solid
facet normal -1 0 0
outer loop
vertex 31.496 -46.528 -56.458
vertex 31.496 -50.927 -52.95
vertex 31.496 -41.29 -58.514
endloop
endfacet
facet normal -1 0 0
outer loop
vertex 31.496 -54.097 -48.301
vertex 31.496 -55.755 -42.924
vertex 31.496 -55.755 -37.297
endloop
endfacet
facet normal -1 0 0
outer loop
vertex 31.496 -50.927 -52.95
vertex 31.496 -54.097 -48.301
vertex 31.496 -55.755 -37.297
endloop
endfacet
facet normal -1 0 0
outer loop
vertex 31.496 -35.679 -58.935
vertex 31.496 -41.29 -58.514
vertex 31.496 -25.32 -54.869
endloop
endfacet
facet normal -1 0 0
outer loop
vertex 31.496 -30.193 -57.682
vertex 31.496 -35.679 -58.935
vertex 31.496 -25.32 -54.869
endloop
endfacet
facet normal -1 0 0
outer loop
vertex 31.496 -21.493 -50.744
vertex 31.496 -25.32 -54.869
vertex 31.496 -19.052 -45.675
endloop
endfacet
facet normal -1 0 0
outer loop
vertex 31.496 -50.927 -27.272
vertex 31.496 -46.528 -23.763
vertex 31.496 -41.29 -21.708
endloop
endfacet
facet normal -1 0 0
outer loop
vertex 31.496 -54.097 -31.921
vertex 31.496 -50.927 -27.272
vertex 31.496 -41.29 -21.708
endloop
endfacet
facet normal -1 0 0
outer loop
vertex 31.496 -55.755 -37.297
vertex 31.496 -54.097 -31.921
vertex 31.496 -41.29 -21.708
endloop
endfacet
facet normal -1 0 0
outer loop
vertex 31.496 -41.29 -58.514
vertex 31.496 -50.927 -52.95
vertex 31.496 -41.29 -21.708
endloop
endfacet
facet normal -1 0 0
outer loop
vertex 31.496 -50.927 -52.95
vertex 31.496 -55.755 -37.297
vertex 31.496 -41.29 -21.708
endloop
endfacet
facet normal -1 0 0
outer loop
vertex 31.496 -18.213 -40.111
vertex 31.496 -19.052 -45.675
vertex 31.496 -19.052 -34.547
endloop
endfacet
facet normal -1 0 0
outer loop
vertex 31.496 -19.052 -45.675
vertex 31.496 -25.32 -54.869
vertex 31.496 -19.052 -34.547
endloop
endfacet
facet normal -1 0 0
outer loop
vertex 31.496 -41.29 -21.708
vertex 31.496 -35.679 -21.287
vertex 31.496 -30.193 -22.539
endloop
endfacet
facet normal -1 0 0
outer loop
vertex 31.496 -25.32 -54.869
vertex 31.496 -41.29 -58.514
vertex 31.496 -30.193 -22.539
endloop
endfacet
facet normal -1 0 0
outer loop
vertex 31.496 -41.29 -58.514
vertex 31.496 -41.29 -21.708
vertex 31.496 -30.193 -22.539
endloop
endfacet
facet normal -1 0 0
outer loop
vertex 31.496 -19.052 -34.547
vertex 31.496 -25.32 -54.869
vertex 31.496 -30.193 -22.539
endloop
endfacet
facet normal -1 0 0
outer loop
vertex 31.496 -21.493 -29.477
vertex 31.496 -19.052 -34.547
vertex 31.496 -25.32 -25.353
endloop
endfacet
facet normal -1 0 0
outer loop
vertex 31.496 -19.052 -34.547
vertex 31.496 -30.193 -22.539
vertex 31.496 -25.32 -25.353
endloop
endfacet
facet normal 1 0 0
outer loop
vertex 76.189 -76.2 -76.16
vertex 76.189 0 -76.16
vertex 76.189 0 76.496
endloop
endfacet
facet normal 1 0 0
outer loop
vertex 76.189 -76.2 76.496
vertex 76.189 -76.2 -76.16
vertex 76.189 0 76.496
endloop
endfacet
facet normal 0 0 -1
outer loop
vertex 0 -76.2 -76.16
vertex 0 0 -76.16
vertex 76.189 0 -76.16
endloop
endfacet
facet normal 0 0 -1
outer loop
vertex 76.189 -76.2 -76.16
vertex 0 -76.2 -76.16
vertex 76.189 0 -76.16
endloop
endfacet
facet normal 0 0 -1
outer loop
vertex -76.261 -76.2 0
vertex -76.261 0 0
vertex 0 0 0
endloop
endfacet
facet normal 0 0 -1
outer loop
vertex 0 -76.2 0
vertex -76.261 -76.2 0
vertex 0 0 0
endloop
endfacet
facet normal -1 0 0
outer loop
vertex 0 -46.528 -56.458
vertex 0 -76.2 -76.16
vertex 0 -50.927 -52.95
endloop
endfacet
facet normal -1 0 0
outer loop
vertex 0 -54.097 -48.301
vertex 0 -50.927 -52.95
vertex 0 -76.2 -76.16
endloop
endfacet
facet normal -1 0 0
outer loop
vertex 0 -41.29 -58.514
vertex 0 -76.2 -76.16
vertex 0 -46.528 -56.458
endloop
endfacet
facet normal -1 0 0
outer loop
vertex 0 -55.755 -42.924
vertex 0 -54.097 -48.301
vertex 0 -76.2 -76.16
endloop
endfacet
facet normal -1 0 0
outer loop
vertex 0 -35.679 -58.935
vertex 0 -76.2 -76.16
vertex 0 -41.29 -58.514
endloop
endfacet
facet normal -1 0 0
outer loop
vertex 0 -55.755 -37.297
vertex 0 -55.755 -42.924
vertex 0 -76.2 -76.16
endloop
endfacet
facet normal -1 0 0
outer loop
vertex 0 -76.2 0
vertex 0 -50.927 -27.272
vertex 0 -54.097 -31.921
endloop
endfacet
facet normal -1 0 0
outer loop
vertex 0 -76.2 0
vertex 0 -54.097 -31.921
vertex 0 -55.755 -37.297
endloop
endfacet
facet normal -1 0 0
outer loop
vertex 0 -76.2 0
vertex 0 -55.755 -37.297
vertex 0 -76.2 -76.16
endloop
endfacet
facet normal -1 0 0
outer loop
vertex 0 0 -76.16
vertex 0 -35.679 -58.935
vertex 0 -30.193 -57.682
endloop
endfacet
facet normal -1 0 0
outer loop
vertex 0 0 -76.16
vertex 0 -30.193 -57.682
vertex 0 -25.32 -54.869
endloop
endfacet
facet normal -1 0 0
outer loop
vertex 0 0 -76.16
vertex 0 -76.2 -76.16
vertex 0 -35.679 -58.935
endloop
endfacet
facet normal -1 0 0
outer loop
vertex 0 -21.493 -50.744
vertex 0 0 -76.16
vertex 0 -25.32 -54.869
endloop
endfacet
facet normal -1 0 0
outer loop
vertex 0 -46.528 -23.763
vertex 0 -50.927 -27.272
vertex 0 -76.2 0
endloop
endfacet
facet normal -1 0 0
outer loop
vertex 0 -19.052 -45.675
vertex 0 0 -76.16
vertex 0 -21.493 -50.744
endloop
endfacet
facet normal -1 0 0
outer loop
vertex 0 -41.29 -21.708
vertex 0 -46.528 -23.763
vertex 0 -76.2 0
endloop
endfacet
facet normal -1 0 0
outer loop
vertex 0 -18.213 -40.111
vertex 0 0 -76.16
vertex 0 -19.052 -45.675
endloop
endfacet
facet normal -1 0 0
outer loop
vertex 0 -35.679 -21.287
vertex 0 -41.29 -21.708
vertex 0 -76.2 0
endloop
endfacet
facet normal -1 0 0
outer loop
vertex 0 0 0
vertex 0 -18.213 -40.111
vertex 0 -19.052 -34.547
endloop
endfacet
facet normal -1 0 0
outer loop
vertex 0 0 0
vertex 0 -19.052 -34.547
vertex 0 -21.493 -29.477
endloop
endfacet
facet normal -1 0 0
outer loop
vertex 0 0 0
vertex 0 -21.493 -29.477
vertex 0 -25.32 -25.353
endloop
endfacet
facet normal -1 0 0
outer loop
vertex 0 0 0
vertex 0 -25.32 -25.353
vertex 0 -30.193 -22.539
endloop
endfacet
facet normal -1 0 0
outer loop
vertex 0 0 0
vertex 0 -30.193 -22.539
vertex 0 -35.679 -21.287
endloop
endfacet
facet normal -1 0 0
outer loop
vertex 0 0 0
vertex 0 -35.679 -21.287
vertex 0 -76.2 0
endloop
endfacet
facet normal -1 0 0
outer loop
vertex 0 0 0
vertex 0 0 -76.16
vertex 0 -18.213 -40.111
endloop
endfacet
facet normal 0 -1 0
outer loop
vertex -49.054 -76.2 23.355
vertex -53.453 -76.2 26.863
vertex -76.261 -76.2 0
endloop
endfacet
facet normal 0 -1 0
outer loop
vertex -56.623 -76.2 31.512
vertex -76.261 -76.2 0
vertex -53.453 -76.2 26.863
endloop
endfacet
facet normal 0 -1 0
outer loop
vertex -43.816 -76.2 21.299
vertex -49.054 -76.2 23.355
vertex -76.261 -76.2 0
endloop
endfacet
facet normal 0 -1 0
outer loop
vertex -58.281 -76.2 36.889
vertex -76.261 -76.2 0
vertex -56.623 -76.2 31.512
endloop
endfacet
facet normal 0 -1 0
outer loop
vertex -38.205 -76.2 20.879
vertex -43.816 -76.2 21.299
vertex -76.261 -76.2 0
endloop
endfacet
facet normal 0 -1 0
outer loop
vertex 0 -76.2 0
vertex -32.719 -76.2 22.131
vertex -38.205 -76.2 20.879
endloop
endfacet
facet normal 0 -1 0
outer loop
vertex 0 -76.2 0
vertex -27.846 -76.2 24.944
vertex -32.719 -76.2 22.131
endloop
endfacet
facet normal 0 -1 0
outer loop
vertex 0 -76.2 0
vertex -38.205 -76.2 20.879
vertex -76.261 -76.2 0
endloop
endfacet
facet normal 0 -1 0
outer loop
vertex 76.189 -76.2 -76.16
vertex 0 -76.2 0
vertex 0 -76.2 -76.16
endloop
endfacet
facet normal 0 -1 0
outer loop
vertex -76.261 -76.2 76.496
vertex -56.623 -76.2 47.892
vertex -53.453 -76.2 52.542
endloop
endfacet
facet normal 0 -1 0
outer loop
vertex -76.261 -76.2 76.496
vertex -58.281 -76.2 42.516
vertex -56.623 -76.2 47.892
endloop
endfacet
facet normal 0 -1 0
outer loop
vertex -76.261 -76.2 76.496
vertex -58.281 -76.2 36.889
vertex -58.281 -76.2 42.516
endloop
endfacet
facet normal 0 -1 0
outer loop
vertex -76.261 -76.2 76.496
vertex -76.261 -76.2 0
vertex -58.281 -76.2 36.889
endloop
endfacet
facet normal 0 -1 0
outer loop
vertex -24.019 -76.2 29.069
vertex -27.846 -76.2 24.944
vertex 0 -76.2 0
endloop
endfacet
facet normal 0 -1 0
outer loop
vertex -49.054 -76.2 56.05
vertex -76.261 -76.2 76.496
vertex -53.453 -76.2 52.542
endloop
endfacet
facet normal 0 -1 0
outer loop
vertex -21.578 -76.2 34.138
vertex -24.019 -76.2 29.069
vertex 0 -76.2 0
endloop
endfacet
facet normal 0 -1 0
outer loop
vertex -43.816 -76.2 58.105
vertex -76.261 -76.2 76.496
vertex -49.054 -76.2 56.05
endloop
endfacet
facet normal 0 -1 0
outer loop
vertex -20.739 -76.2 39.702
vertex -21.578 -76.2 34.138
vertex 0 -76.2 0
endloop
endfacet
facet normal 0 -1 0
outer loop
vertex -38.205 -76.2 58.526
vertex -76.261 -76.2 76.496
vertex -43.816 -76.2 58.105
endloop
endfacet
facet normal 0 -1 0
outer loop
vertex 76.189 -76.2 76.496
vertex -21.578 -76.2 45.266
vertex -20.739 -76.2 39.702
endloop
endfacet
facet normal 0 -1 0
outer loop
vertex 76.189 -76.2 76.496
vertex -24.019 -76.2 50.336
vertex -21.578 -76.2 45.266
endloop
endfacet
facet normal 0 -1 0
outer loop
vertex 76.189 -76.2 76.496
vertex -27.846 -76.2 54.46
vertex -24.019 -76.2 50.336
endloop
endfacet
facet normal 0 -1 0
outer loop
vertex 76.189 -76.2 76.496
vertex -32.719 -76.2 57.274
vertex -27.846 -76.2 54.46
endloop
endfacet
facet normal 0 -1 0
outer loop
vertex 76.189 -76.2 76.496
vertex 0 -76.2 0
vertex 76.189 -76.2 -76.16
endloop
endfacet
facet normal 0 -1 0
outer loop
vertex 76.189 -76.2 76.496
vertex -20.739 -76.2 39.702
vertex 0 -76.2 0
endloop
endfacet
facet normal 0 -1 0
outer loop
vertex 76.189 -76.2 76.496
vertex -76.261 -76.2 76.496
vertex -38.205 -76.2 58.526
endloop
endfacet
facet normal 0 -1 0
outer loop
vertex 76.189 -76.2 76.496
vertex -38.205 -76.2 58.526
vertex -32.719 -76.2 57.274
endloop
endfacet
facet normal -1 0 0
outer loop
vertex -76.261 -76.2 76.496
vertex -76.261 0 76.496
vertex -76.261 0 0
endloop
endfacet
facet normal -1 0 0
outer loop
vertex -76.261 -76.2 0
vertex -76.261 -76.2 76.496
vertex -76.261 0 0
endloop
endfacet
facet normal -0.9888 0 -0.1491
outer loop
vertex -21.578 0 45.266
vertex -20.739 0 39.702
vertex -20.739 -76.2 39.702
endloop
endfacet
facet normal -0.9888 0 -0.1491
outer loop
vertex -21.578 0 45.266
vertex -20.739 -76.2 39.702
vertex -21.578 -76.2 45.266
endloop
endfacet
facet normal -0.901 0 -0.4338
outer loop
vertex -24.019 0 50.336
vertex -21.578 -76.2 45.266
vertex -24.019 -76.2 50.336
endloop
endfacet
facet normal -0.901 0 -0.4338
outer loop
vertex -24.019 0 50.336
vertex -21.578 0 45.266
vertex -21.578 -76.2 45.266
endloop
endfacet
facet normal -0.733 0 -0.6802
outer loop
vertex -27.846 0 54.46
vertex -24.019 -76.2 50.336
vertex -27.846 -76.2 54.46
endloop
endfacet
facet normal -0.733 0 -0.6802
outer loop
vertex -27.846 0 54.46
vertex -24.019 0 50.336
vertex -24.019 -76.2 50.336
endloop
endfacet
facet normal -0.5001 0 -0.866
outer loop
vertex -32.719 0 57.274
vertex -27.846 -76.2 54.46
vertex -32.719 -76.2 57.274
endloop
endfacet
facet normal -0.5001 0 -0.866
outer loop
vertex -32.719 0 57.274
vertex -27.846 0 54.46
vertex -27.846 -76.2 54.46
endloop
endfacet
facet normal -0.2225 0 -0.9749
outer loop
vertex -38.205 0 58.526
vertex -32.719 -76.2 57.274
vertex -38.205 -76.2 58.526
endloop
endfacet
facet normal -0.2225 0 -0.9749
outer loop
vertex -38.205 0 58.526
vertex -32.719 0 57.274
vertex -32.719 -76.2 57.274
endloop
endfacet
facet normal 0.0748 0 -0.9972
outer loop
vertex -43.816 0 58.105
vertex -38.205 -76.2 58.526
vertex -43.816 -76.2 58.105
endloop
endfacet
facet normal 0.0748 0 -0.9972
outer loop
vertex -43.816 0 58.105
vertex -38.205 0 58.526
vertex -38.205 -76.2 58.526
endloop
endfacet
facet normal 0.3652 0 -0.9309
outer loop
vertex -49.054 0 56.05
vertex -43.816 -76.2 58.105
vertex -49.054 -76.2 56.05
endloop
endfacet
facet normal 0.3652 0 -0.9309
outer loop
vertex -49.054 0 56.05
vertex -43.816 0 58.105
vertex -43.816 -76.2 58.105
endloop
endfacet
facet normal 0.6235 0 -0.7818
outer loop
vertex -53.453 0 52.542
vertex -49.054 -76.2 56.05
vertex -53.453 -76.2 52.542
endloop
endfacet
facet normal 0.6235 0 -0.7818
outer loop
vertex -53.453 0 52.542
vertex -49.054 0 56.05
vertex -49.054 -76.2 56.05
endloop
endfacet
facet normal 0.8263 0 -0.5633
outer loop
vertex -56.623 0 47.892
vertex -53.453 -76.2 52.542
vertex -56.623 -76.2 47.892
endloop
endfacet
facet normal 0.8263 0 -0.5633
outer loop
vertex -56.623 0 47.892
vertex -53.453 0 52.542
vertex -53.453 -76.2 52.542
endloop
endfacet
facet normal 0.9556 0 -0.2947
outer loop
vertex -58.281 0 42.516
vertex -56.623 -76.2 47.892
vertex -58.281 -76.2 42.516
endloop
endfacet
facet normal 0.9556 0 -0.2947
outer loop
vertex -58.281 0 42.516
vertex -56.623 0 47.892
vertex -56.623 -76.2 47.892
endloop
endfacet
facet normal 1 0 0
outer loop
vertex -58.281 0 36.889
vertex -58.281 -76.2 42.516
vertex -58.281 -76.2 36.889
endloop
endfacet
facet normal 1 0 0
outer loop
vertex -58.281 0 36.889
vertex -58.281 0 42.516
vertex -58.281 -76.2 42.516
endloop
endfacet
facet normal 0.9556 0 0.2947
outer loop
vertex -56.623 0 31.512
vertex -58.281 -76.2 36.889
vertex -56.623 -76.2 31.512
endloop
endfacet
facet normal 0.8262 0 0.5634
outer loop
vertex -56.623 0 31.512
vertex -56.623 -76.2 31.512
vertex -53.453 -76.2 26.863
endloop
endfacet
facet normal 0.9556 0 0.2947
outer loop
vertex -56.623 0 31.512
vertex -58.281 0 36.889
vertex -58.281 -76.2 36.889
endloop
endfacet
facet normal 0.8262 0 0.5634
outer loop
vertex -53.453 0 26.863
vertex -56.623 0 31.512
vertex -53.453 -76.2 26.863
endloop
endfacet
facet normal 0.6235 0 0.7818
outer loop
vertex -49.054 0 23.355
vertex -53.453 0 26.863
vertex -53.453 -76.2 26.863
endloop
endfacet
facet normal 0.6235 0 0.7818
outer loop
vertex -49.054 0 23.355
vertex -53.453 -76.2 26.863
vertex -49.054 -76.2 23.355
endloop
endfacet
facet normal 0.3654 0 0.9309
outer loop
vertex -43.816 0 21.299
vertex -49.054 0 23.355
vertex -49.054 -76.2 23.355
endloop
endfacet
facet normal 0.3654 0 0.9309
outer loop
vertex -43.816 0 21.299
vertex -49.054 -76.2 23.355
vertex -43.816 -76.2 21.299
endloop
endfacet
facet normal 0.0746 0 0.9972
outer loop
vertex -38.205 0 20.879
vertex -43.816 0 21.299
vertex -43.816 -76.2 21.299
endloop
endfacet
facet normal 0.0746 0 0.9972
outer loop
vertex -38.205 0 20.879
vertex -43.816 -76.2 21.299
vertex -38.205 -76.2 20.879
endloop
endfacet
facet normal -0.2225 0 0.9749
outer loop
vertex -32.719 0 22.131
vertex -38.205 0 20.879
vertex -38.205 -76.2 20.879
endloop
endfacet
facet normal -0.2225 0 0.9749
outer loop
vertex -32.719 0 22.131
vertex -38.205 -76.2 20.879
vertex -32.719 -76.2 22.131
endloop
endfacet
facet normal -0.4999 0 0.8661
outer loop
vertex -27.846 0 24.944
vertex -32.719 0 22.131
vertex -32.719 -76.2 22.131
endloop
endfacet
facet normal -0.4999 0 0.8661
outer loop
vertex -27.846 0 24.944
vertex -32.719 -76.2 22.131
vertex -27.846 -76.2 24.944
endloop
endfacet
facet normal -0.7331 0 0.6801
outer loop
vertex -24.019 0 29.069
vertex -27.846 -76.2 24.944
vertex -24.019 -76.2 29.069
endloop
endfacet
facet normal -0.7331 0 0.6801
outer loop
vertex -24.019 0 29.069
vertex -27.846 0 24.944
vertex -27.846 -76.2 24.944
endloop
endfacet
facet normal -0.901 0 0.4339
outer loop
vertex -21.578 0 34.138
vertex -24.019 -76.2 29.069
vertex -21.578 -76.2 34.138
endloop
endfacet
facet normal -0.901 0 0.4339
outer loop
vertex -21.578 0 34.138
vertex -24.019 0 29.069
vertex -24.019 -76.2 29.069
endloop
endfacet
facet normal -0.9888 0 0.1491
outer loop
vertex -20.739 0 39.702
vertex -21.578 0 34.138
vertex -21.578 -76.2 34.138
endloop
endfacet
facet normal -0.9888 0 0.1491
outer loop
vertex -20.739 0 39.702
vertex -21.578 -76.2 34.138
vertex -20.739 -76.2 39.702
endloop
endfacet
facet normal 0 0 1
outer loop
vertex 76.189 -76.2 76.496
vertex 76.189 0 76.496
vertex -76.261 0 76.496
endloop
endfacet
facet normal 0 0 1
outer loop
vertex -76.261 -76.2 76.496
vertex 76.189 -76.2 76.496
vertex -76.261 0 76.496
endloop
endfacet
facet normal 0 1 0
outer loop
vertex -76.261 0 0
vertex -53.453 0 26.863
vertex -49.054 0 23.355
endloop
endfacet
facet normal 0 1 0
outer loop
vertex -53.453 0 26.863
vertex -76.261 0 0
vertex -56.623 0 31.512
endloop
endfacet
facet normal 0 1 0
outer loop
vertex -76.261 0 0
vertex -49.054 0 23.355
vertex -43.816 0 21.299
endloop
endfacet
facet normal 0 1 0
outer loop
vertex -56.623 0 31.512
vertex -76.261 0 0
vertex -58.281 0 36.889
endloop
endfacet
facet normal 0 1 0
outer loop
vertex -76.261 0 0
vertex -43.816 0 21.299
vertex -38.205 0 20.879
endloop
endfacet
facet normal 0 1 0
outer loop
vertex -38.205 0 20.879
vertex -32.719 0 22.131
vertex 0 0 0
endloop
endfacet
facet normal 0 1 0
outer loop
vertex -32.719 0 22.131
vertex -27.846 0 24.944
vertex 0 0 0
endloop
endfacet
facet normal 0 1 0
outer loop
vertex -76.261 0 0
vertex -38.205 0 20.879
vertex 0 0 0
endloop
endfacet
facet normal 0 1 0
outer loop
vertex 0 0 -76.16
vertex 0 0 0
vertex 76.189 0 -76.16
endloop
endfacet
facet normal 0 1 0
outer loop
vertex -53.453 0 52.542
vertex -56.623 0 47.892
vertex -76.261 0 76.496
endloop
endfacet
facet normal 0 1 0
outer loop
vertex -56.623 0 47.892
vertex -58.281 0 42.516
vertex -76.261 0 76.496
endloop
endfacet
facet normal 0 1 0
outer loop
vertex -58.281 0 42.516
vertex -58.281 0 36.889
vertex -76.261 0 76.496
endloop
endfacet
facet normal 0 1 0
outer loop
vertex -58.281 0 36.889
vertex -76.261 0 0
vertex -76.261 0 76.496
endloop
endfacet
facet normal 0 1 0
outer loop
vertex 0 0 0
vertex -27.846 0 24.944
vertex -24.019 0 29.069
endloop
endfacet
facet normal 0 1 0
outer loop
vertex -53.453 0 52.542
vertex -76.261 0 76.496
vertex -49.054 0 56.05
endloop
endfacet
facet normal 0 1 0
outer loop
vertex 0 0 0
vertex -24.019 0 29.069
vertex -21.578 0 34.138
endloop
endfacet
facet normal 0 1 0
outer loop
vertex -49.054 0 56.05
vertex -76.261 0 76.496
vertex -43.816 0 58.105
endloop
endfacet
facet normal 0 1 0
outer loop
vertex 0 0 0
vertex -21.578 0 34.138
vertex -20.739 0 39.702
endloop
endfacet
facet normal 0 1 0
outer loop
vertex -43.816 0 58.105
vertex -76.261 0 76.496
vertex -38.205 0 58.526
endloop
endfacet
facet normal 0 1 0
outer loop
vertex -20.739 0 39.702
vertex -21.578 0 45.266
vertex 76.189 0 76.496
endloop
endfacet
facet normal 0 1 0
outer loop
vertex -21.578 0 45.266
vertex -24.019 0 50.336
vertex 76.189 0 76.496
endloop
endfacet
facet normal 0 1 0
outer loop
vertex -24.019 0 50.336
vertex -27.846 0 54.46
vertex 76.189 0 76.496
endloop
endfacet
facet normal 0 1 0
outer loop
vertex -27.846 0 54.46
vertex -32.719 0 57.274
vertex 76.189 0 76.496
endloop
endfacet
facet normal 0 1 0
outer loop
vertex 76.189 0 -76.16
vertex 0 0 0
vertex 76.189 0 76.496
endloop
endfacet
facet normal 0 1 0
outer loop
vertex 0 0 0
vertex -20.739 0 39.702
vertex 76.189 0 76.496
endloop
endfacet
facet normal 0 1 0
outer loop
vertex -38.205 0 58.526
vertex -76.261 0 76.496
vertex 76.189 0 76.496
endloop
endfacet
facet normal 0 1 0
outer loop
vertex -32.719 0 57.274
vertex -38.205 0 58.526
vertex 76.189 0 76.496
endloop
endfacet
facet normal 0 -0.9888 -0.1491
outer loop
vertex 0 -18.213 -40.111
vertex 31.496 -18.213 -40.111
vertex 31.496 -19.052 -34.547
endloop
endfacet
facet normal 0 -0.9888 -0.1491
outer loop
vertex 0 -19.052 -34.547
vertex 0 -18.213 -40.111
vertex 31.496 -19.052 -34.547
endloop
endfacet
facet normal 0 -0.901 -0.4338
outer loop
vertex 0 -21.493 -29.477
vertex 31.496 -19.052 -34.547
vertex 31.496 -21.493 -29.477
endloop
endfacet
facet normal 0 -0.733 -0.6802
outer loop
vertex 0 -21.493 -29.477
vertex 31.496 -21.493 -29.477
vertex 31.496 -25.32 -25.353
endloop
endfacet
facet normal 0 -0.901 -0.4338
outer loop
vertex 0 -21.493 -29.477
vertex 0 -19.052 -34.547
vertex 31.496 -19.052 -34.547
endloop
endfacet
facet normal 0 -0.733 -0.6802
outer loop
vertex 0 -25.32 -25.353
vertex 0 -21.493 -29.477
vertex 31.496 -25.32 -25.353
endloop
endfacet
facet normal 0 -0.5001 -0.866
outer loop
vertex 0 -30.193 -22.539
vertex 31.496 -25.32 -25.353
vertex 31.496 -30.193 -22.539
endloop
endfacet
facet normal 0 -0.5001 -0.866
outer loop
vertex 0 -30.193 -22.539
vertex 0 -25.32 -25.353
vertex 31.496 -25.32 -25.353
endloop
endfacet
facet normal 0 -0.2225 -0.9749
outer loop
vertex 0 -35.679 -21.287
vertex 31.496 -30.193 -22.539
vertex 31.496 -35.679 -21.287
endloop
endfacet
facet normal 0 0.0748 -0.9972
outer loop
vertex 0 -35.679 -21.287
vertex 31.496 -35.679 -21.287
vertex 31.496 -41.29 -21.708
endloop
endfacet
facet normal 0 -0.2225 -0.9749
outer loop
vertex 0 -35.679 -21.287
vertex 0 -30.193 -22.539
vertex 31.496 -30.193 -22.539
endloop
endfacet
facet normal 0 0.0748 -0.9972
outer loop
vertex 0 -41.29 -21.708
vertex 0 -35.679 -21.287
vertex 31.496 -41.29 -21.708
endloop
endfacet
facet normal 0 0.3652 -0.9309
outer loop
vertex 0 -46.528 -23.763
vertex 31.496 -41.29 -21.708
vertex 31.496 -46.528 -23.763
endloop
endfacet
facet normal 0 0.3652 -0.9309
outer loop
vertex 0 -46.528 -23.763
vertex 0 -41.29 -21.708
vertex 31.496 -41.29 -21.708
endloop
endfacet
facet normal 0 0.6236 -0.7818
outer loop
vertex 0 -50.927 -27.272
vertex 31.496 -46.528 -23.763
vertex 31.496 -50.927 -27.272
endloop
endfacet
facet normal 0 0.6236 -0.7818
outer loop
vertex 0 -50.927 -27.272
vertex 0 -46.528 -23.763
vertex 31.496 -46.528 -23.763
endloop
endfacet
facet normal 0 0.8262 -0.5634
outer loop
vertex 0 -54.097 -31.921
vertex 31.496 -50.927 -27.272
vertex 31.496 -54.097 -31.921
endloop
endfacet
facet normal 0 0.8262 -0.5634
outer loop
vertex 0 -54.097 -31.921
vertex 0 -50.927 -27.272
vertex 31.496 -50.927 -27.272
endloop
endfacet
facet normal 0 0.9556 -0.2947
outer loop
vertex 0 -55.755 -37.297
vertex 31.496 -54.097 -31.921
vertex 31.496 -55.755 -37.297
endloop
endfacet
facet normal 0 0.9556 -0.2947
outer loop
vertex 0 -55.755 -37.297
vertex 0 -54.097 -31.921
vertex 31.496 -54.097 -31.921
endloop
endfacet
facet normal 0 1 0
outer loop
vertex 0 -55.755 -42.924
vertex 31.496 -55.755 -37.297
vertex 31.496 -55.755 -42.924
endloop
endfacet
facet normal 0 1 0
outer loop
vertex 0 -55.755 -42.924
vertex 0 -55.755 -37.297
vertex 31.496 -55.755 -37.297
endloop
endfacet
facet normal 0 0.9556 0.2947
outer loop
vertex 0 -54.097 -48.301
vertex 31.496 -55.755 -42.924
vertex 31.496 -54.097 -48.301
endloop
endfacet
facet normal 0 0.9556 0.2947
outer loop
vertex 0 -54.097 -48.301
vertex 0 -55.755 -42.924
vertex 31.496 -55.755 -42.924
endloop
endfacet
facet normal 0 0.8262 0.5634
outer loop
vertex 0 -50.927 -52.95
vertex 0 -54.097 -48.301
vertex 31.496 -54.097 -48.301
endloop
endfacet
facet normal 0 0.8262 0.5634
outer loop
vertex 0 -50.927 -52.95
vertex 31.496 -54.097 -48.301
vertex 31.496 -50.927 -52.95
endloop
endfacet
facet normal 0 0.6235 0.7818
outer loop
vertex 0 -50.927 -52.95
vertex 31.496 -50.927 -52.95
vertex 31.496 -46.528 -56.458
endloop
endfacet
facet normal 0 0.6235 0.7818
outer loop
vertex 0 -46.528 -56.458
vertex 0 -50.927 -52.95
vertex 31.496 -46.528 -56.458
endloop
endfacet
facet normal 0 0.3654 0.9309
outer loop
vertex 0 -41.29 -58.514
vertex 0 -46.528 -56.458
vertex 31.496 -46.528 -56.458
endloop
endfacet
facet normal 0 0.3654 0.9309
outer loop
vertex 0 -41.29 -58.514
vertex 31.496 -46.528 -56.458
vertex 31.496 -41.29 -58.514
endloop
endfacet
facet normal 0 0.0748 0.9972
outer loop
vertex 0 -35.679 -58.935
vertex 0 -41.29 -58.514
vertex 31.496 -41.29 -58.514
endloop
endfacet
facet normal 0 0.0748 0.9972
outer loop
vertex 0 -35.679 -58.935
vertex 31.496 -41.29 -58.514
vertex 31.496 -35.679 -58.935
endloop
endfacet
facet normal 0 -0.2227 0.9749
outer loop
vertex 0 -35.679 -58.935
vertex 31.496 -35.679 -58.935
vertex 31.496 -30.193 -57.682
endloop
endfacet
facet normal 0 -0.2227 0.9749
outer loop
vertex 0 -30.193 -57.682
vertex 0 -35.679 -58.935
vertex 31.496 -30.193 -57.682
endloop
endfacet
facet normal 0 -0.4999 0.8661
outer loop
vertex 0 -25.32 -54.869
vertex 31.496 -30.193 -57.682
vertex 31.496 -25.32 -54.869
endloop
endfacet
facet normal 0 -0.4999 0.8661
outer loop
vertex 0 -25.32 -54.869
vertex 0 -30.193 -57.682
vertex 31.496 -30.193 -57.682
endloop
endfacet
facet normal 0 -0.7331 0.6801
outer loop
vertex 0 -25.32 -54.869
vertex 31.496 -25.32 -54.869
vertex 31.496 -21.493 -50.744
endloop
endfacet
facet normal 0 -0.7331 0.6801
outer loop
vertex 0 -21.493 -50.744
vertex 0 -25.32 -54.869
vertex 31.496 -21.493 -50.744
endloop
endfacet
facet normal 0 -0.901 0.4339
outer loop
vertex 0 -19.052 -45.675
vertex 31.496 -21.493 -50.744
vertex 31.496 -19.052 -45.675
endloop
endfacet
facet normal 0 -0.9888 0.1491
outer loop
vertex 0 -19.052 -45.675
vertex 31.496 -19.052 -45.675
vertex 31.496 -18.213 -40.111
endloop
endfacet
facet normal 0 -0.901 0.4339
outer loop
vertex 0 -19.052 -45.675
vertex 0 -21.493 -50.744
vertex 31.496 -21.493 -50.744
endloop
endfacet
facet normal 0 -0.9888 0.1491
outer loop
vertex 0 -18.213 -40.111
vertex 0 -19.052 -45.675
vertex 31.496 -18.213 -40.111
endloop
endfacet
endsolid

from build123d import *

# Parameters (mm, degrees)
F0_R     = 18.876469
F0_W     = 76.189078
F0_H     = 76.160066
F1_DEPTH = 76.2
F2_R     = 18.876469
F3_DEPTH = 31.496


with BuildPart() as f1:
    # F0 (on Front) → F1 (new body)
    with BuildSketch(Plane.XZ):
        Polygon((76.189078, 76.495655), (-76.260686, 76.495655), (-76.260686, 0), (0, 0), (76.189078, 0), align=None)
        with Locations((-39.615575, 39.702263)):
            Circle(F0_R, mode=Mode.SUBTRACT)
        with Locations((38.094539, -38.080033)):
            Rectangle(F0_W, F0_H)
    extrude(amount=F1_DEPTH)

    # F2 (on Right) → F3 (cut)
    with BuildSketch(Plane.YZ):
        with Locations((-37.08962, -40.110841)):
            Circle(F2_R)
    extrude(amount=F3_DEPTH, mode=Mode.SUBTRACT)


solid = f1.part
